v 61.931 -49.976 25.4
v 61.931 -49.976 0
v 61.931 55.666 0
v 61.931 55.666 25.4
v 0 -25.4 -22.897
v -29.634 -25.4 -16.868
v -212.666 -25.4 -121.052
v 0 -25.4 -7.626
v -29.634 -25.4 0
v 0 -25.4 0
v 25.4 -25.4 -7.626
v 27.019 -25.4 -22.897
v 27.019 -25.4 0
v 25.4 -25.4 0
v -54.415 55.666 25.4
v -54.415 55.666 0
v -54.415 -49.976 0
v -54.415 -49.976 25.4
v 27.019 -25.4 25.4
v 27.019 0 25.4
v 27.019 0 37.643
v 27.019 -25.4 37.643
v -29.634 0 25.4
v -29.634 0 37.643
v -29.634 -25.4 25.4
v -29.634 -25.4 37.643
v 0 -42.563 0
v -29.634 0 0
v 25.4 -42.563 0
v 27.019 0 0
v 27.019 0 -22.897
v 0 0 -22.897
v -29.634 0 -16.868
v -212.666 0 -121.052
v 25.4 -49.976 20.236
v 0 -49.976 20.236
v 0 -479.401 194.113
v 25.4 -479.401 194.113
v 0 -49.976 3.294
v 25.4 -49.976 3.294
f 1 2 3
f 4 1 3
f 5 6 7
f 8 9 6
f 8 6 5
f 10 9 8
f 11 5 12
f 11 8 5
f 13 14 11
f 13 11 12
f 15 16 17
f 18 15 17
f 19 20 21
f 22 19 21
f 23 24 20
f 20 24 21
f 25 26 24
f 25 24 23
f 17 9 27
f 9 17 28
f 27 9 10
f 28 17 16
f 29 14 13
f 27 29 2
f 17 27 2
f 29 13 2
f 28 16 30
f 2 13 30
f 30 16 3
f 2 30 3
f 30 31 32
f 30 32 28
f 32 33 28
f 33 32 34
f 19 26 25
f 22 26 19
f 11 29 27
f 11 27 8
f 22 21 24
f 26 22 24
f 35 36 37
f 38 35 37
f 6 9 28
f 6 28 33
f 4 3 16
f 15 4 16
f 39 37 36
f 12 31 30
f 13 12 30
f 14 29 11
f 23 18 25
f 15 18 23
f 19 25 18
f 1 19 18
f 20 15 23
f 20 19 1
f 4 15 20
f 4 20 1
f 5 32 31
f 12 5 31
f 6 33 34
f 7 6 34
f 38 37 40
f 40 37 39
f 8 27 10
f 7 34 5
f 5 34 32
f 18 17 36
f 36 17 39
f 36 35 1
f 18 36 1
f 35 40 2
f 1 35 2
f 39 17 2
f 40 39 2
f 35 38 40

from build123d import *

# Parameters (mm, degrees)
F0_W     = 61.931412667
F0_H     = 55.6655190885
F0_H_2   = 49.976002425
F0_W_2   = 54.4153526425
F1_DEPTH = 25.4
F2_W     = 29.6337604523
F2_H     = 28.9934612811
F2_W_2   = 27.0190127194
F3_DEPTH = 25.4
F5_DEPTH = 25.4


with BuildPart() as f1:
    # F0 (on Top) → F1 (new body)
    with BuildSketch(Plane.XY):
        with Locations((30.9657063335, 27.8327595443)):
            Rectangle(F0_W, F0_H)
        with Locations((30.9657063335, -24.9880012125)):
            Rectangle(F0_W, F0_H_2)
        with Locations((-27.2076763213, -24.9880012125)):
            Rectangle(F0_W_2, F0_H_2)
        with Locations((-27.2076763213, 27.8327595443)):
            Rectangle(F0_W_2, F0_H)
    extrude(amount=F1_DEPTH)

    # F2 (on Front) → F3 (join)
    with BuildSketch(Plane.XZ):
        Polygon((0, 0), (0, 8.6490437388), (-29.6337604523, 8.6490437388), (-29.6337604523, -16.8678652386), align=None)
        with Locations((-14.8168802261, 23.1457743794)):
            Rectangle(F2_W, F2_H)
        with Locations((13.5095063597, 23.1457743794)):
            Rectangle(F2_W_2, F2_H)
        Polygon((27.0190127194, 8.6490437388), (0, 8.6490437388), (0, 0), (0, -22.8965952992), (27.0190127194, -22.8965952992), align=None)
        Polygon((0, -22.8965952992), (0, 0), (-29.6337604523, -16.8678652386), (-29.6337604523, -22.8965952992), align=None)
        Polygon((-29.6337604523, -22.8965952992), (-29.6337604523, -16.8678652386), (-212.6657664776, -121.0517138243), (0, -22.8965952992), align=None)
    extrude(amount=F3_DEPTH)

    # F4 (on Right) → F5 (join)
    with BuildSketch(Plane.YZ):
        Polygon((0, -18.9130362123), (0, 0), (-479.4011116028, 194.1131353378), align=None)
    extrude(amount=F5_DEPTH)


solid = f1.part
